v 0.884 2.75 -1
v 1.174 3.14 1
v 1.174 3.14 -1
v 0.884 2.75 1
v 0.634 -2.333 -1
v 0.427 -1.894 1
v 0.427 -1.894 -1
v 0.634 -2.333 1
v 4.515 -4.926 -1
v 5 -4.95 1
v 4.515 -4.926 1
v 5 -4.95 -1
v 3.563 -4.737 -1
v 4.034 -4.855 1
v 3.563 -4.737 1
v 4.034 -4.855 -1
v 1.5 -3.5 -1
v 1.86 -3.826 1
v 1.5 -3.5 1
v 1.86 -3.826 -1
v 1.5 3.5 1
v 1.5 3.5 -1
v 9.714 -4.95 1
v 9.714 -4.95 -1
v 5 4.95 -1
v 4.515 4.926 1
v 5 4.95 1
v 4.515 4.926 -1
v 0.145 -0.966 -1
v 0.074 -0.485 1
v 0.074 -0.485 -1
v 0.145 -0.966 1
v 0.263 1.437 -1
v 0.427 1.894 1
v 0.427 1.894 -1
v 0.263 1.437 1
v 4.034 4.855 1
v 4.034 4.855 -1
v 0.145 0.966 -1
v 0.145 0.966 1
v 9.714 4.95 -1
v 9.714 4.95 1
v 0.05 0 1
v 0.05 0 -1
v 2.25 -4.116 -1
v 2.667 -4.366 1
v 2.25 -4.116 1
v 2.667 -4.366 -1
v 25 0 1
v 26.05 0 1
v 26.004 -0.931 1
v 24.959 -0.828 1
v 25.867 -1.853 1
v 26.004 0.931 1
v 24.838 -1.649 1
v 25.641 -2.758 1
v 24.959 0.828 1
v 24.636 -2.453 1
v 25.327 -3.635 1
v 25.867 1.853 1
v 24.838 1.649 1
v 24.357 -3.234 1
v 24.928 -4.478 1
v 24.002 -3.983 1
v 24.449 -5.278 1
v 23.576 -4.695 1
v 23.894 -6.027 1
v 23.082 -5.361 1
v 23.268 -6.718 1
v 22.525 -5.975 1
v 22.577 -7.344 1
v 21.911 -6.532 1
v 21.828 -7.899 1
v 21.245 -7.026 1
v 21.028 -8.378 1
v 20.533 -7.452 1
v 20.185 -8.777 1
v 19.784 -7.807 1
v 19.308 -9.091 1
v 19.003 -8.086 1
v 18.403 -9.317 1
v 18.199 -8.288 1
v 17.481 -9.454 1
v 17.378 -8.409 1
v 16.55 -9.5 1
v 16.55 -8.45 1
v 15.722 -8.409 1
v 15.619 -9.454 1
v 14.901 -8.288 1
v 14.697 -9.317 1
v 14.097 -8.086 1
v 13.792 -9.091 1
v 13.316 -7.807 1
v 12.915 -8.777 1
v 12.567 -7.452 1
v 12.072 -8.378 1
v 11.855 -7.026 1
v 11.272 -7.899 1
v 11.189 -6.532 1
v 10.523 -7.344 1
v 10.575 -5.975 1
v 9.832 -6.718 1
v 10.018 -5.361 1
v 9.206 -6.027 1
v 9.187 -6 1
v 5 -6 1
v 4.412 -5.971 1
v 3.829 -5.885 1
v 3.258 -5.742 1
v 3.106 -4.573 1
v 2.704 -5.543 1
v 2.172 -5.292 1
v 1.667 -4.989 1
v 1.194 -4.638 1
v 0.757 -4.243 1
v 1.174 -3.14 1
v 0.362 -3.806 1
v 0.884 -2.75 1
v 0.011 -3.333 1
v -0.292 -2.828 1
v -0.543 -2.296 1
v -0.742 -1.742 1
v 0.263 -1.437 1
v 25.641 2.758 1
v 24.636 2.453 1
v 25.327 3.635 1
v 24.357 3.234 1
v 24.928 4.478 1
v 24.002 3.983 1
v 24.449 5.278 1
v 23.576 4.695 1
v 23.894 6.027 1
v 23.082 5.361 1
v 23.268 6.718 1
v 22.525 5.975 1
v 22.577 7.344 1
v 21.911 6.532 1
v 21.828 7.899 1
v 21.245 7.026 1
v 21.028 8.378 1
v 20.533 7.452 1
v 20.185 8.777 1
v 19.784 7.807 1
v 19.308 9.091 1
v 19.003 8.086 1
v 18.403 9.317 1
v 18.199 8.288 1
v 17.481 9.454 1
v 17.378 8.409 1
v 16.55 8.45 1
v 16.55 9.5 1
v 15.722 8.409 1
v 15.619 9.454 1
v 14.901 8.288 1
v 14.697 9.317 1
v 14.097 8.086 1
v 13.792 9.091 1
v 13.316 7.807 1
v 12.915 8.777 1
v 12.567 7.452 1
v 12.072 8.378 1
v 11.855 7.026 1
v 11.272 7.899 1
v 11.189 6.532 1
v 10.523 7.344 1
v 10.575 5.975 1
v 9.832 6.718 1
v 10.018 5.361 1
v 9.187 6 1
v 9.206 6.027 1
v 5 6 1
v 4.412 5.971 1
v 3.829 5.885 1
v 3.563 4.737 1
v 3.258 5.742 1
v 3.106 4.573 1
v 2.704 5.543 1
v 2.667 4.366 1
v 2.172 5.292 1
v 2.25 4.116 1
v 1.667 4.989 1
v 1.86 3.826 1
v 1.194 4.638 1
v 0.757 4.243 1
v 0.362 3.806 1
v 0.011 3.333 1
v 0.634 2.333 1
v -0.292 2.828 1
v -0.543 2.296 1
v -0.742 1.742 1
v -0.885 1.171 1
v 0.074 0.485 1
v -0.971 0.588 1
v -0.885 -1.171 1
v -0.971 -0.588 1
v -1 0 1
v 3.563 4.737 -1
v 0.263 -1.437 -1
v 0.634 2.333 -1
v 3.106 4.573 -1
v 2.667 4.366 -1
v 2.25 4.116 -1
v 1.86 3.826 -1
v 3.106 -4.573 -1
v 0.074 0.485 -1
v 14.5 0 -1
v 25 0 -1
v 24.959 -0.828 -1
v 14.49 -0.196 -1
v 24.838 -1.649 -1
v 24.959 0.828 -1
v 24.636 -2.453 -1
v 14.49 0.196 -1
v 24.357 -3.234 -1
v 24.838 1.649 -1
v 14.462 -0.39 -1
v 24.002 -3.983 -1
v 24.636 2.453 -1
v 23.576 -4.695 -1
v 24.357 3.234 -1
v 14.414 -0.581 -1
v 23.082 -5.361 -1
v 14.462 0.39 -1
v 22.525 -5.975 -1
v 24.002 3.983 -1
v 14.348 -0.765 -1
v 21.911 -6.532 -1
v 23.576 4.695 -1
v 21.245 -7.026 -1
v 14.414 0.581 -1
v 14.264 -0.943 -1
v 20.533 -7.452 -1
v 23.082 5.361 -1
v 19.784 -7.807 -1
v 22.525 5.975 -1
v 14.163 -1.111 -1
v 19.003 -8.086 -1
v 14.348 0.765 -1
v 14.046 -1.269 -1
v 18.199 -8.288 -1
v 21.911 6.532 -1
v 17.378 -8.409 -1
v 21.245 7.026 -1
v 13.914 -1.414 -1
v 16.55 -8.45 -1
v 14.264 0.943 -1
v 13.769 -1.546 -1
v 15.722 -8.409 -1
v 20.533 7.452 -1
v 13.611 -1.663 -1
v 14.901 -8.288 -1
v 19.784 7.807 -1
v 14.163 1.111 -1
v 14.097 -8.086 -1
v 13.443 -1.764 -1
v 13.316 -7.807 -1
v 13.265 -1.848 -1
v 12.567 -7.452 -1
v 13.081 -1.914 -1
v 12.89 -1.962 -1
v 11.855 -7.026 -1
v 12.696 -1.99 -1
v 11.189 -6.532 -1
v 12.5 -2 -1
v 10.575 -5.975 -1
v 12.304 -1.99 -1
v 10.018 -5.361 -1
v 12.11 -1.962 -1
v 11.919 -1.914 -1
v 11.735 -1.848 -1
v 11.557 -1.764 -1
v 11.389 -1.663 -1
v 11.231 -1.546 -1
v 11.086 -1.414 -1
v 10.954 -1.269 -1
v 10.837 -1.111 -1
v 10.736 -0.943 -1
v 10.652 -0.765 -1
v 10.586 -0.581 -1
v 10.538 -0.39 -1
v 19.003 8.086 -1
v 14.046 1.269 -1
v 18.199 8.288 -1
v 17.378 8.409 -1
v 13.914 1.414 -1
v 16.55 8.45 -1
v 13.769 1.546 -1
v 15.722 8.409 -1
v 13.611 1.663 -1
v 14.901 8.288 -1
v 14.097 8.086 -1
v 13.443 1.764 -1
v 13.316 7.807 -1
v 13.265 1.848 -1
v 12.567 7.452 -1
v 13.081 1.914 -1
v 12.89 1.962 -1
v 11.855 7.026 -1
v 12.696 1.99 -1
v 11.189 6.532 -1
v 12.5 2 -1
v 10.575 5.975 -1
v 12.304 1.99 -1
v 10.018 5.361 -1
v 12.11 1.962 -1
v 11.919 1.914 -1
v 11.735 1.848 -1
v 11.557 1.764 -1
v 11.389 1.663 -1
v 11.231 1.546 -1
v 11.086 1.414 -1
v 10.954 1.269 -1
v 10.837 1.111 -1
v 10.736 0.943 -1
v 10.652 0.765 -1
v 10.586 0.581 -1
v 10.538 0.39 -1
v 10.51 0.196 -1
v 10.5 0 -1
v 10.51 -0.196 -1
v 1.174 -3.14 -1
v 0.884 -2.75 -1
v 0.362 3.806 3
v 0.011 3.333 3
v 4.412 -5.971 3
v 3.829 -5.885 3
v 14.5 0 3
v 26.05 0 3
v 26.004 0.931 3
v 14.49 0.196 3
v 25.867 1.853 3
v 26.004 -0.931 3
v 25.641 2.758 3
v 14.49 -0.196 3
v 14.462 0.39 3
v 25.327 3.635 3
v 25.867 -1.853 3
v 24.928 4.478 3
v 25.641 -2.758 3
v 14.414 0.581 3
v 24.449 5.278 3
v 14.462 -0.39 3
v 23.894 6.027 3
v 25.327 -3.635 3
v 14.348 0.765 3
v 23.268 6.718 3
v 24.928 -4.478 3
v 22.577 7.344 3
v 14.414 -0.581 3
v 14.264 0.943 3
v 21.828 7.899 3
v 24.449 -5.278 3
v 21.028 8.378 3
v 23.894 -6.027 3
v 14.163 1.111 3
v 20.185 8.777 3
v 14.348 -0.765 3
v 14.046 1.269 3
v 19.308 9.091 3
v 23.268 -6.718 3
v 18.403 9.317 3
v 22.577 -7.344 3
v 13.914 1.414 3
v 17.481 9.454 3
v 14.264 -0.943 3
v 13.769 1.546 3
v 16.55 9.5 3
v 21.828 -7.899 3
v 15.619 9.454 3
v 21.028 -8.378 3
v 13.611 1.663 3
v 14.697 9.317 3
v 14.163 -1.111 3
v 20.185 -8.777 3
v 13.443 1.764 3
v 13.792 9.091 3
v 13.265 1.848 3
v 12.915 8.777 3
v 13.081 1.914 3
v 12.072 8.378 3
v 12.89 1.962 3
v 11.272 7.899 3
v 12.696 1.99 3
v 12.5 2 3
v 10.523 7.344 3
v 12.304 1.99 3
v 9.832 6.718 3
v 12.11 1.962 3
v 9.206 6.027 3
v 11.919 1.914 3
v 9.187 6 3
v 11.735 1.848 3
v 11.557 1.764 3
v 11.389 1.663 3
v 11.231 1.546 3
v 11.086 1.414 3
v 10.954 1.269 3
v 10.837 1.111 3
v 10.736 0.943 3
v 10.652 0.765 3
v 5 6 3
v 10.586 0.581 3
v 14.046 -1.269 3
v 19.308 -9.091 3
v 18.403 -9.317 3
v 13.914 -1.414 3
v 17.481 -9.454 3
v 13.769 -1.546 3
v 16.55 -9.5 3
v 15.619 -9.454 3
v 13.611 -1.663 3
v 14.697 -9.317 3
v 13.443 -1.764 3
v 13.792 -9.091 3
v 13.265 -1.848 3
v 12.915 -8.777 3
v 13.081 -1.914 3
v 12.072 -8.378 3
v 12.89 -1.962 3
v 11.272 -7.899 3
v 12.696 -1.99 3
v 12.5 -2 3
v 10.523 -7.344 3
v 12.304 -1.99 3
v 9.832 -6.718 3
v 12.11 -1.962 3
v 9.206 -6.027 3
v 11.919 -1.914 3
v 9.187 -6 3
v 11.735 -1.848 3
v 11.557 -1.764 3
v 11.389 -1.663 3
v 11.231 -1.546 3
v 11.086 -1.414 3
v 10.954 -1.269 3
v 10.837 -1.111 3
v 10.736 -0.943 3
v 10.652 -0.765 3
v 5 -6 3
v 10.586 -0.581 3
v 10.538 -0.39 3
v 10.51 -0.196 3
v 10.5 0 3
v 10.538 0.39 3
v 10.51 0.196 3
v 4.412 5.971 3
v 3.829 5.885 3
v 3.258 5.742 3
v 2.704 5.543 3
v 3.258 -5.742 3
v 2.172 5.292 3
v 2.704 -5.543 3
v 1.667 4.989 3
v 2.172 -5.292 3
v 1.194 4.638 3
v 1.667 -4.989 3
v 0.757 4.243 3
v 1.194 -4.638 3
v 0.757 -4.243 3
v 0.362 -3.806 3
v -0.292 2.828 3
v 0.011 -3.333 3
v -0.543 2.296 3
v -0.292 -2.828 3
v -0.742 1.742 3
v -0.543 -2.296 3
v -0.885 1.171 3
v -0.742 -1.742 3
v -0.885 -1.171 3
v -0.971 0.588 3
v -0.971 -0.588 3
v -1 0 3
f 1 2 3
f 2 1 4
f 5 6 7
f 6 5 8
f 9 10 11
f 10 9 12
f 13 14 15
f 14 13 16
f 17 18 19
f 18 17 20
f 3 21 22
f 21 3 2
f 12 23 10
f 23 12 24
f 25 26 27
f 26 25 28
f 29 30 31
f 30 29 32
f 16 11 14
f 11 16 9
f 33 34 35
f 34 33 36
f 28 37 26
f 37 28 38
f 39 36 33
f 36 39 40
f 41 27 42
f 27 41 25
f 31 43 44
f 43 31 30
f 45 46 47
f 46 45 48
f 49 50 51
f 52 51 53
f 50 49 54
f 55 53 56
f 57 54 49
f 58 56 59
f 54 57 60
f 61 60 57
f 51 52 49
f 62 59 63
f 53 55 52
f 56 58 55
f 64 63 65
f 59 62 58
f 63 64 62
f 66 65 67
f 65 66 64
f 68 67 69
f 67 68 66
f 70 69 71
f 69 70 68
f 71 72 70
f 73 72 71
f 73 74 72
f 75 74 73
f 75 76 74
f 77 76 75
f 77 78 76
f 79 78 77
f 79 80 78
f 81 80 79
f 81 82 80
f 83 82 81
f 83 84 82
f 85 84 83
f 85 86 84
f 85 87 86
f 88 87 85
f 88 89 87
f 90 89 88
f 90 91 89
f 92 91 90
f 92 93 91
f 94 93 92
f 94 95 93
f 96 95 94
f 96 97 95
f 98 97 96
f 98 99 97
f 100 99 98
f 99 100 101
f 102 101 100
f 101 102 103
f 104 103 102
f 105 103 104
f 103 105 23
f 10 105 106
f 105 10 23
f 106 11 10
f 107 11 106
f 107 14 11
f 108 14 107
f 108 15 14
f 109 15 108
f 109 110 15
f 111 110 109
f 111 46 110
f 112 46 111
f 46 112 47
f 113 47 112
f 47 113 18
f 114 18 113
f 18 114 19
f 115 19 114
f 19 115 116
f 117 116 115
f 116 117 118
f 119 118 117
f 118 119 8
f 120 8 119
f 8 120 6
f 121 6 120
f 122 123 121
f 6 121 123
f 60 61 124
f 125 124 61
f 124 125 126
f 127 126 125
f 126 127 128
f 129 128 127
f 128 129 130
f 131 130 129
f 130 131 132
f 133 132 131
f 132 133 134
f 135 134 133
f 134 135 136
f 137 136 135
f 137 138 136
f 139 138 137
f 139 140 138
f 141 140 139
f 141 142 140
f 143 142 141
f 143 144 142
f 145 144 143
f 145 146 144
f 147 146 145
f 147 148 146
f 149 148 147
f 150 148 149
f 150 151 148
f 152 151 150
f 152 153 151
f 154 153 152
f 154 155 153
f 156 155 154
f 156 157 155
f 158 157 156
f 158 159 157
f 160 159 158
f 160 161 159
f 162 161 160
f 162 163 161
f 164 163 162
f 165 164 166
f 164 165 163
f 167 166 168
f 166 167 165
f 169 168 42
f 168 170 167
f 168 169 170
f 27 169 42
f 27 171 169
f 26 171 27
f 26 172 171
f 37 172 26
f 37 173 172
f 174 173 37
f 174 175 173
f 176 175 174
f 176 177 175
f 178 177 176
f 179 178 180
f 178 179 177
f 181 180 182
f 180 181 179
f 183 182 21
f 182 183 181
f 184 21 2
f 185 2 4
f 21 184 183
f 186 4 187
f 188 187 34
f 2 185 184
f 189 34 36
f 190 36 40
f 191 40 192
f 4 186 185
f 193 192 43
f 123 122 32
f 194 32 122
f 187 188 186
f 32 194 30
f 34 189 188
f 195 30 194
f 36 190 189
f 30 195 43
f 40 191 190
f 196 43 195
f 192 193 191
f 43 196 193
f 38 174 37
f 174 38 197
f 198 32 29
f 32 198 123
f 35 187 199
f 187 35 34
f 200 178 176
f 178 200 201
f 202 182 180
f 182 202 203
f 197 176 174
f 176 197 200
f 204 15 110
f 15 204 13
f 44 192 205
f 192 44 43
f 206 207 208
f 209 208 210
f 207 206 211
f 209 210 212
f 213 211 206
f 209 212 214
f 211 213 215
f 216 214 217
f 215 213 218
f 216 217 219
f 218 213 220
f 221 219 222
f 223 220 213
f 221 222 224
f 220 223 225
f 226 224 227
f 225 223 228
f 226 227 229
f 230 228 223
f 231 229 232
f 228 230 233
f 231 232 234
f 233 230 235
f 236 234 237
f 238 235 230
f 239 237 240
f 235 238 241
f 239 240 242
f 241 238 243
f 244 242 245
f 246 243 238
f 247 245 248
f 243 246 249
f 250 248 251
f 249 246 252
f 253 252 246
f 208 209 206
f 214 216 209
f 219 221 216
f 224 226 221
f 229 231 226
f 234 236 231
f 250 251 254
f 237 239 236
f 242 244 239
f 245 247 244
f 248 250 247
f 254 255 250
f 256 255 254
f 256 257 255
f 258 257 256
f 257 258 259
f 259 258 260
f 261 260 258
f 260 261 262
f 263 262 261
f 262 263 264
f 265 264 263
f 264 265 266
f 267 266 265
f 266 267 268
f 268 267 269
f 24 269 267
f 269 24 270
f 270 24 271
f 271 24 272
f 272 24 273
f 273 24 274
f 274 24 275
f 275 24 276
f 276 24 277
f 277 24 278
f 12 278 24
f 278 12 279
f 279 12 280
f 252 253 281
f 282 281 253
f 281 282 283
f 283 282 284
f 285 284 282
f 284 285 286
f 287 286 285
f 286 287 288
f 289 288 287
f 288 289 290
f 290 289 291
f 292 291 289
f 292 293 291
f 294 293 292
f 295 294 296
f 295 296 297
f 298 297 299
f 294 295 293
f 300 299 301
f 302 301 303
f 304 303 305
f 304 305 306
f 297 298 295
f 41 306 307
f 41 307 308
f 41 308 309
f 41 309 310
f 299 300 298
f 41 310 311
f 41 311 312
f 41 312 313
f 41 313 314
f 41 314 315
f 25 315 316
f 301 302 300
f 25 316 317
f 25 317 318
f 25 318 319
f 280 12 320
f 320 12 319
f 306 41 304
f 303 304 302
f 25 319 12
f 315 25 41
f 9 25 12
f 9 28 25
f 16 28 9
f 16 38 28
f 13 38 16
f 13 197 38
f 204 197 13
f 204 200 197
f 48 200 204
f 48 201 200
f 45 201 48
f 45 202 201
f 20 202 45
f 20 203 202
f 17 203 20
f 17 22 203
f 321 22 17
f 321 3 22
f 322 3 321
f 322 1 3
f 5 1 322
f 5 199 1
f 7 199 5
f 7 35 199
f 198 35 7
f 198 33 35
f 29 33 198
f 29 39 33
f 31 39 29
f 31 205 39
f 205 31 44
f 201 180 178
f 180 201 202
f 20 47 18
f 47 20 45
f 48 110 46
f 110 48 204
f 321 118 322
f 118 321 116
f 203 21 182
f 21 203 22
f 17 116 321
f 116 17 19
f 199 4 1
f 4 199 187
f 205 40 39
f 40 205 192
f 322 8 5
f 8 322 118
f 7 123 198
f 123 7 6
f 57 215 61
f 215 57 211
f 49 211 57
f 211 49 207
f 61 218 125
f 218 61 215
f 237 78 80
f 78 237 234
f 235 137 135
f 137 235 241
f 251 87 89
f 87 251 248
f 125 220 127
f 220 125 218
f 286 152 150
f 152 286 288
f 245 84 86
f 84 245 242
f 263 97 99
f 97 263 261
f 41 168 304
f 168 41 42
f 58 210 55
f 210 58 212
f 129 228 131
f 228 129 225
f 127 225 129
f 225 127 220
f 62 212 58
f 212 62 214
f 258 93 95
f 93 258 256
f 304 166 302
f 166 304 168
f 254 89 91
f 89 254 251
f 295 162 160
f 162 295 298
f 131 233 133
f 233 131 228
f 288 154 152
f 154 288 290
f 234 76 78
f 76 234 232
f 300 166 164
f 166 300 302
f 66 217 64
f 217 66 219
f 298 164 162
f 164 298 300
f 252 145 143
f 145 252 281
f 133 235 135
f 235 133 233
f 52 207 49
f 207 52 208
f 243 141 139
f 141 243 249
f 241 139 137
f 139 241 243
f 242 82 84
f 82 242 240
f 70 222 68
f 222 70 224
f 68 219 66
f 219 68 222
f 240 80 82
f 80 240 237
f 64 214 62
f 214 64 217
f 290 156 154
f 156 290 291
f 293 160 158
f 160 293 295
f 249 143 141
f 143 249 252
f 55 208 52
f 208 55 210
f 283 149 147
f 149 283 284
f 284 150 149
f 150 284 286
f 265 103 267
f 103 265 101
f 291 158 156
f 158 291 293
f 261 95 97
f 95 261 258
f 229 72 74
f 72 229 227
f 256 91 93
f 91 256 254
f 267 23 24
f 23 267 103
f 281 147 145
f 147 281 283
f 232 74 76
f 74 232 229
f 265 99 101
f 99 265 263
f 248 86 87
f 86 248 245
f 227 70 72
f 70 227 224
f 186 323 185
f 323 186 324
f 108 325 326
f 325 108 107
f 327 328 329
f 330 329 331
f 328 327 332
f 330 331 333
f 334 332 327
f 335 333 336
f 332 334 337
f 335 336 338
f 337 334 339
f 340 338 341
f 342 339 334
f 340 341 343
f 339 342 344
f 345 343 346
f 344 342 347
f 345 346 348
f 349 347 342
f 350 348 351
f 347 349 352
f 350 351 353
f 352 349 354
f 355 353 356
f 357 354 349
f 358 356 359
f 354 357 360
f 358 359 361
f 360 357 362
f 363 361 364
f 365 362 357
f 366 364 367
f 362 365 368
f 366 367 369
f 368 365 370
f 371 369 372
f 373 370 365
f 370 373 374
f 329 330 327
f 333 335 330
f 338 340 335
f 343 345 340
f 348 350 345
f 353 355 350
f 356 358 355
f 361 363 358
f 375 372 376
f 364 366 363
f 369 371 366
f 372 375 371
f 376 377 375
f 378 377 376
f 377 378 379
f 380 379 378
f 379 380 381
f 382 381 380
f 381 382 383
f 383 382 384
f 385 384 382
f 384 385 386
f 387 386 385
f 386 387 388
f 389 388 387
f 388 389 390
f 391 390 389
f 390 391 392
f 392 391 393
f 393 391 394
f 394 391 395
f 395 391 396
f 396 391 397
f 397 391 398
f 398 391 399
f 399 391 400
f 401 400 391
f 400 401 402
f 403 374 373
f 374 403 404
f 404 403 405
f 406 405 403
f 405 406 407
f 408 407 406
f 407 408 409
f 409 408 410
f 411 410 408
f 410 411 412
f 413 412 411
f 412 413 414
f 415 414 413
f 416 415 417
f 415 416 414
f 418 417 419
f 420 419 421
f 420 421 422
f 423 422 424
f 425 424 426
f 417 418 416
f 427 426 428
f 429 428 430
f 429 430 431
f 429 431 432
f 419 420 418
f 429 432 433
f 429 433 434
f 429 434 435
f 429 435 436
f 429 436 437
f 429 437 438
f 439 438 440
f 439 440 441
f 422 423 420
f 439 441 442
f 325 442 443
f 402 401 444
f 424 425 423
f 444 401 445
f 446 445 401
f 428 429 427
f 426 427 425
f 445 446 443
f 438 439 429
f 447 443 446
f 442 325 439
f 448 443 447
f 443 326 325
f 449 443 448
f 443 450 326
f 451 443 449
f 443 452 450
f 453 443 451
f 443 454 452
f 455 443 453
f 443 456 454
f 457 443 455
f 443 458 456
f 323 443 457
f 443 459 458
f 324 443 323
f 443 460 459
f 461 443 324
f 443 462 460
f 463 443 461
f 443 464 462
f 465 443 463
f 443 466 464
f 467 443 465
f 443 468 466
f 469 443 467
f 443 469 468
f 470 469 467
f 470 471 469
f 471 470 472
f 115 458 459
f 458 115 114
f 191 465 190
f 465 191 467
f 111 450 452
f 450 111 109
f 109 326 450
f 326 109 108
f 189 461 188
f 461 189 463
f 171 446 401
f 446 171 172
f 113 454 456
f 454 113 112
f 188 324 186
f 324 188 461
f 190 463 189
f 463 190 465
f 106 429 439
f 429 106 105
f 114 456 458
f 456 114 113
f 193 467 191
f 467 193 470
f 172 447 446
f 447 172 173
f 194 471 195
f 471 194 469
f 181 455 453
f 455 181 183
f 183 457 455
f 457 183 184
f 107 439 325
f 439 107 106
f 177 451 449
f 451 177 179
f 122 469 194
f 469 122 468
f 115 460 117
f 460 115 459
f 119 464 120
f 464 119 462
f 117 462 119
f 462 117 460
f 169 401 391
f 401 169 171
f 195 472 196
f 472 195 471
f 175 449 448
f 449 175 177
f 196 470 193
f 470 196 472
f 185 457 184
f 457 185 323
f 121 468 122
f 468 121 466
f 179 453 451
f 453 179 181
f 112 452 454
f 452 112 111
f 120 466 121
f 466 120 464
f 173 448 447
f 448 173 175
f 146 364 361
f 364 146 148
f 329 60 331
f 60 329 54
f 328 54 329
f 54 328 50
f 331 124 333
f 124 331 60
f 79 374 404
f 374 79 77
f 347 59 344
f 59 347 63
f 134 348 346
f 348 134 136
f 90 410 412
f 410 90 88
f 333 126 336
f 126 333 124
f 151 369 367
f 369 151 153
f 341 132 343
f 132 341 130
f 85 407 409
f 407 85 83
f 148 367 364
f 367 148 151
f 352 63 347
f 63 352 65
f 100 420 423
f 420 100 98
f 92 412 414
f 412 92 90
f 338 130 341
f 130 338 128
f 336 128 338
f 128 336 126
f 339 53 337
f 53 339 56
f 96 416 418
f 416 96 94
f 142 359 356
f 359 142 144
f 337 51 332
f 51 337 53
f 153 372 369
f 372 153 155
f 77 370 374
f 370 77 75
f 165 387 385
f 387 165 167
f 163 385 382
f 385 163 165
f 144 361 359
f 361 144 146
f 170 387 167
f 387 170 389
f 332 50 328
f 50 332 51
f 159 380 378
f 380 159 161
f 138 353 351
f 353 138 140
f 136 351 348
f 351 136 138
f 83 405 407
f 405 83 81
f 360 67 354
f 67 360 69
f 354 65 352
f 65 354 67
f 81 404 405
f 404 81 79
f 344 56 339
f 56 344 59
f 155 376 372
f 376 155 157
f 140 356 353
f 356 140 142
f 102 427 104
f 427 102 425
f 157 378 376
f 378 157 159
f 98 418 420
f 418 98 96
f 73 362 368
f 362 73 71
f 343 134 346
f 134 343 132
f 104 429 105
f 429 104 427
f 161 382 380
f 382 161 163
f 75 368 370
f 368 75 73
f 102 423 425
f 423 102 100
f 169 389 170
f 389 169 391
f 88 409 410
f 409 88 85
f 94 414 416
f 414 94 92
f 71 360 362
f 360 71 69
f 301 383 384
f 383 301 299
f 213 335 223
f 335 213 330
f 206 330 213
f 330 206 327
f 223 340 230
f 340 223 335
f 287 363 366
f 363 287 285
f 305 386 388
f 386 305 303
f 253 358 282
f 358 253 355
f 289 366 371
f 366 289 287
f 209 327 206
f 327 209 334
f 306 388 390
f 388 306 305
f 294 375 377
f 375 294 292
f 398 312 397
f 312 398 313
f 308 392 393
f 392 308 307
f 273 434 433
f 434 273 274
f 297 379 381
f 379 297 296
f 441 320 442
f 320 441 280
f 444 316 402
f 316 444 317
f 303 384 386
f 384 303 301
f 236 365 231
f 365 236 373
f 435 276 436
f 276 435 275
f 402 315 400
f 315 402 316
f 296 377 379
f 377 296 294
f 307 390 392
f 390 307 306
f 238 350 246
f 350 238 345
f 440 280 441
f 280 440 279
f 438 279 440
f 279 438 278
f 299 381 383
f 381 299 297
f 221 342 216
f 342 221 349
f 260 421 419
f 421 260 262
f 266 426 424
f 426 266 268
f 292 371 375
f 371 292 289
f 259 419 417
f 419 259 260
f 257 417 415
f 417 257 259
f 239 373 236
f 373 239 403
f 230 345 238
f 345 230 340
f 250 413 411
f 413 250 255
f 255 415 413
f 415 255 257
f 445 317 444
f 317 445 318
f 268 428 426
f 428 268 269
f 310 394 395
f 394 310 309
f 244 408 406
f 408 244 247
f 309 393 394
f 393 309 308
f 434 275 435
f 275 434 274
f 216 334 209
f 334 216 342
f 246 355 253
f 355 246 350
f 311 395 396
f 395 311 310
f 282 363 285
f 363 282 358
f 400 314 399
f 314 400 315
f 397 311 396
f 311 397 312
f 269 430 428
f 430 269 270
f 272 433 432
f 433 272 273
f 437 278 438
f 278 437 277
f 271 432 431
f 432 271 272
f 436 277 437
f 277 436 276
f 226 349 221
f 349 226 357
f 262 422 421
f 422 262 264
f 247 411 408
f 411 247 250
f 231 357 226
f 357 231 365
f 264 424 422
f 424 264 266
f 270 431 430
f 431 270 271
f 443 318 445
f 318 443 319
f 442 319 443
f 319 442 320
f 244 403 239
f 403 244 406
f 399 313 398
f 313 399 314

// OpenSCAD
// 19" underdesk screw adapter
// version 1
// 26.07.2026 Sebastian Weigl

$fn=64;

// main body
difference(){
  union() {
    hull( ) {
      translate([5,0,0])
      cylinder(h=2,d=9.9,center=true);
      translate([15,0,0])
      cylinder(h=2,d=9.9,center=true);
    }
    translate([25-(16.9/2),0,0])
    cylinder(h=2,d=16.9,center=true);
    hull( ) {
      translate([5,0,2])
      cylinder(h=2,d=12,center=true);
      translate([15,0,2])
      cylinder(h=2,d=12,center=true);
    }
    translate([25-(16.9/2),0,2])
    cylinder(h=2,d=19,center=true);
  }
translate([12.5,0,0])
#cylinder(h=10,d=4,center=true);
}
